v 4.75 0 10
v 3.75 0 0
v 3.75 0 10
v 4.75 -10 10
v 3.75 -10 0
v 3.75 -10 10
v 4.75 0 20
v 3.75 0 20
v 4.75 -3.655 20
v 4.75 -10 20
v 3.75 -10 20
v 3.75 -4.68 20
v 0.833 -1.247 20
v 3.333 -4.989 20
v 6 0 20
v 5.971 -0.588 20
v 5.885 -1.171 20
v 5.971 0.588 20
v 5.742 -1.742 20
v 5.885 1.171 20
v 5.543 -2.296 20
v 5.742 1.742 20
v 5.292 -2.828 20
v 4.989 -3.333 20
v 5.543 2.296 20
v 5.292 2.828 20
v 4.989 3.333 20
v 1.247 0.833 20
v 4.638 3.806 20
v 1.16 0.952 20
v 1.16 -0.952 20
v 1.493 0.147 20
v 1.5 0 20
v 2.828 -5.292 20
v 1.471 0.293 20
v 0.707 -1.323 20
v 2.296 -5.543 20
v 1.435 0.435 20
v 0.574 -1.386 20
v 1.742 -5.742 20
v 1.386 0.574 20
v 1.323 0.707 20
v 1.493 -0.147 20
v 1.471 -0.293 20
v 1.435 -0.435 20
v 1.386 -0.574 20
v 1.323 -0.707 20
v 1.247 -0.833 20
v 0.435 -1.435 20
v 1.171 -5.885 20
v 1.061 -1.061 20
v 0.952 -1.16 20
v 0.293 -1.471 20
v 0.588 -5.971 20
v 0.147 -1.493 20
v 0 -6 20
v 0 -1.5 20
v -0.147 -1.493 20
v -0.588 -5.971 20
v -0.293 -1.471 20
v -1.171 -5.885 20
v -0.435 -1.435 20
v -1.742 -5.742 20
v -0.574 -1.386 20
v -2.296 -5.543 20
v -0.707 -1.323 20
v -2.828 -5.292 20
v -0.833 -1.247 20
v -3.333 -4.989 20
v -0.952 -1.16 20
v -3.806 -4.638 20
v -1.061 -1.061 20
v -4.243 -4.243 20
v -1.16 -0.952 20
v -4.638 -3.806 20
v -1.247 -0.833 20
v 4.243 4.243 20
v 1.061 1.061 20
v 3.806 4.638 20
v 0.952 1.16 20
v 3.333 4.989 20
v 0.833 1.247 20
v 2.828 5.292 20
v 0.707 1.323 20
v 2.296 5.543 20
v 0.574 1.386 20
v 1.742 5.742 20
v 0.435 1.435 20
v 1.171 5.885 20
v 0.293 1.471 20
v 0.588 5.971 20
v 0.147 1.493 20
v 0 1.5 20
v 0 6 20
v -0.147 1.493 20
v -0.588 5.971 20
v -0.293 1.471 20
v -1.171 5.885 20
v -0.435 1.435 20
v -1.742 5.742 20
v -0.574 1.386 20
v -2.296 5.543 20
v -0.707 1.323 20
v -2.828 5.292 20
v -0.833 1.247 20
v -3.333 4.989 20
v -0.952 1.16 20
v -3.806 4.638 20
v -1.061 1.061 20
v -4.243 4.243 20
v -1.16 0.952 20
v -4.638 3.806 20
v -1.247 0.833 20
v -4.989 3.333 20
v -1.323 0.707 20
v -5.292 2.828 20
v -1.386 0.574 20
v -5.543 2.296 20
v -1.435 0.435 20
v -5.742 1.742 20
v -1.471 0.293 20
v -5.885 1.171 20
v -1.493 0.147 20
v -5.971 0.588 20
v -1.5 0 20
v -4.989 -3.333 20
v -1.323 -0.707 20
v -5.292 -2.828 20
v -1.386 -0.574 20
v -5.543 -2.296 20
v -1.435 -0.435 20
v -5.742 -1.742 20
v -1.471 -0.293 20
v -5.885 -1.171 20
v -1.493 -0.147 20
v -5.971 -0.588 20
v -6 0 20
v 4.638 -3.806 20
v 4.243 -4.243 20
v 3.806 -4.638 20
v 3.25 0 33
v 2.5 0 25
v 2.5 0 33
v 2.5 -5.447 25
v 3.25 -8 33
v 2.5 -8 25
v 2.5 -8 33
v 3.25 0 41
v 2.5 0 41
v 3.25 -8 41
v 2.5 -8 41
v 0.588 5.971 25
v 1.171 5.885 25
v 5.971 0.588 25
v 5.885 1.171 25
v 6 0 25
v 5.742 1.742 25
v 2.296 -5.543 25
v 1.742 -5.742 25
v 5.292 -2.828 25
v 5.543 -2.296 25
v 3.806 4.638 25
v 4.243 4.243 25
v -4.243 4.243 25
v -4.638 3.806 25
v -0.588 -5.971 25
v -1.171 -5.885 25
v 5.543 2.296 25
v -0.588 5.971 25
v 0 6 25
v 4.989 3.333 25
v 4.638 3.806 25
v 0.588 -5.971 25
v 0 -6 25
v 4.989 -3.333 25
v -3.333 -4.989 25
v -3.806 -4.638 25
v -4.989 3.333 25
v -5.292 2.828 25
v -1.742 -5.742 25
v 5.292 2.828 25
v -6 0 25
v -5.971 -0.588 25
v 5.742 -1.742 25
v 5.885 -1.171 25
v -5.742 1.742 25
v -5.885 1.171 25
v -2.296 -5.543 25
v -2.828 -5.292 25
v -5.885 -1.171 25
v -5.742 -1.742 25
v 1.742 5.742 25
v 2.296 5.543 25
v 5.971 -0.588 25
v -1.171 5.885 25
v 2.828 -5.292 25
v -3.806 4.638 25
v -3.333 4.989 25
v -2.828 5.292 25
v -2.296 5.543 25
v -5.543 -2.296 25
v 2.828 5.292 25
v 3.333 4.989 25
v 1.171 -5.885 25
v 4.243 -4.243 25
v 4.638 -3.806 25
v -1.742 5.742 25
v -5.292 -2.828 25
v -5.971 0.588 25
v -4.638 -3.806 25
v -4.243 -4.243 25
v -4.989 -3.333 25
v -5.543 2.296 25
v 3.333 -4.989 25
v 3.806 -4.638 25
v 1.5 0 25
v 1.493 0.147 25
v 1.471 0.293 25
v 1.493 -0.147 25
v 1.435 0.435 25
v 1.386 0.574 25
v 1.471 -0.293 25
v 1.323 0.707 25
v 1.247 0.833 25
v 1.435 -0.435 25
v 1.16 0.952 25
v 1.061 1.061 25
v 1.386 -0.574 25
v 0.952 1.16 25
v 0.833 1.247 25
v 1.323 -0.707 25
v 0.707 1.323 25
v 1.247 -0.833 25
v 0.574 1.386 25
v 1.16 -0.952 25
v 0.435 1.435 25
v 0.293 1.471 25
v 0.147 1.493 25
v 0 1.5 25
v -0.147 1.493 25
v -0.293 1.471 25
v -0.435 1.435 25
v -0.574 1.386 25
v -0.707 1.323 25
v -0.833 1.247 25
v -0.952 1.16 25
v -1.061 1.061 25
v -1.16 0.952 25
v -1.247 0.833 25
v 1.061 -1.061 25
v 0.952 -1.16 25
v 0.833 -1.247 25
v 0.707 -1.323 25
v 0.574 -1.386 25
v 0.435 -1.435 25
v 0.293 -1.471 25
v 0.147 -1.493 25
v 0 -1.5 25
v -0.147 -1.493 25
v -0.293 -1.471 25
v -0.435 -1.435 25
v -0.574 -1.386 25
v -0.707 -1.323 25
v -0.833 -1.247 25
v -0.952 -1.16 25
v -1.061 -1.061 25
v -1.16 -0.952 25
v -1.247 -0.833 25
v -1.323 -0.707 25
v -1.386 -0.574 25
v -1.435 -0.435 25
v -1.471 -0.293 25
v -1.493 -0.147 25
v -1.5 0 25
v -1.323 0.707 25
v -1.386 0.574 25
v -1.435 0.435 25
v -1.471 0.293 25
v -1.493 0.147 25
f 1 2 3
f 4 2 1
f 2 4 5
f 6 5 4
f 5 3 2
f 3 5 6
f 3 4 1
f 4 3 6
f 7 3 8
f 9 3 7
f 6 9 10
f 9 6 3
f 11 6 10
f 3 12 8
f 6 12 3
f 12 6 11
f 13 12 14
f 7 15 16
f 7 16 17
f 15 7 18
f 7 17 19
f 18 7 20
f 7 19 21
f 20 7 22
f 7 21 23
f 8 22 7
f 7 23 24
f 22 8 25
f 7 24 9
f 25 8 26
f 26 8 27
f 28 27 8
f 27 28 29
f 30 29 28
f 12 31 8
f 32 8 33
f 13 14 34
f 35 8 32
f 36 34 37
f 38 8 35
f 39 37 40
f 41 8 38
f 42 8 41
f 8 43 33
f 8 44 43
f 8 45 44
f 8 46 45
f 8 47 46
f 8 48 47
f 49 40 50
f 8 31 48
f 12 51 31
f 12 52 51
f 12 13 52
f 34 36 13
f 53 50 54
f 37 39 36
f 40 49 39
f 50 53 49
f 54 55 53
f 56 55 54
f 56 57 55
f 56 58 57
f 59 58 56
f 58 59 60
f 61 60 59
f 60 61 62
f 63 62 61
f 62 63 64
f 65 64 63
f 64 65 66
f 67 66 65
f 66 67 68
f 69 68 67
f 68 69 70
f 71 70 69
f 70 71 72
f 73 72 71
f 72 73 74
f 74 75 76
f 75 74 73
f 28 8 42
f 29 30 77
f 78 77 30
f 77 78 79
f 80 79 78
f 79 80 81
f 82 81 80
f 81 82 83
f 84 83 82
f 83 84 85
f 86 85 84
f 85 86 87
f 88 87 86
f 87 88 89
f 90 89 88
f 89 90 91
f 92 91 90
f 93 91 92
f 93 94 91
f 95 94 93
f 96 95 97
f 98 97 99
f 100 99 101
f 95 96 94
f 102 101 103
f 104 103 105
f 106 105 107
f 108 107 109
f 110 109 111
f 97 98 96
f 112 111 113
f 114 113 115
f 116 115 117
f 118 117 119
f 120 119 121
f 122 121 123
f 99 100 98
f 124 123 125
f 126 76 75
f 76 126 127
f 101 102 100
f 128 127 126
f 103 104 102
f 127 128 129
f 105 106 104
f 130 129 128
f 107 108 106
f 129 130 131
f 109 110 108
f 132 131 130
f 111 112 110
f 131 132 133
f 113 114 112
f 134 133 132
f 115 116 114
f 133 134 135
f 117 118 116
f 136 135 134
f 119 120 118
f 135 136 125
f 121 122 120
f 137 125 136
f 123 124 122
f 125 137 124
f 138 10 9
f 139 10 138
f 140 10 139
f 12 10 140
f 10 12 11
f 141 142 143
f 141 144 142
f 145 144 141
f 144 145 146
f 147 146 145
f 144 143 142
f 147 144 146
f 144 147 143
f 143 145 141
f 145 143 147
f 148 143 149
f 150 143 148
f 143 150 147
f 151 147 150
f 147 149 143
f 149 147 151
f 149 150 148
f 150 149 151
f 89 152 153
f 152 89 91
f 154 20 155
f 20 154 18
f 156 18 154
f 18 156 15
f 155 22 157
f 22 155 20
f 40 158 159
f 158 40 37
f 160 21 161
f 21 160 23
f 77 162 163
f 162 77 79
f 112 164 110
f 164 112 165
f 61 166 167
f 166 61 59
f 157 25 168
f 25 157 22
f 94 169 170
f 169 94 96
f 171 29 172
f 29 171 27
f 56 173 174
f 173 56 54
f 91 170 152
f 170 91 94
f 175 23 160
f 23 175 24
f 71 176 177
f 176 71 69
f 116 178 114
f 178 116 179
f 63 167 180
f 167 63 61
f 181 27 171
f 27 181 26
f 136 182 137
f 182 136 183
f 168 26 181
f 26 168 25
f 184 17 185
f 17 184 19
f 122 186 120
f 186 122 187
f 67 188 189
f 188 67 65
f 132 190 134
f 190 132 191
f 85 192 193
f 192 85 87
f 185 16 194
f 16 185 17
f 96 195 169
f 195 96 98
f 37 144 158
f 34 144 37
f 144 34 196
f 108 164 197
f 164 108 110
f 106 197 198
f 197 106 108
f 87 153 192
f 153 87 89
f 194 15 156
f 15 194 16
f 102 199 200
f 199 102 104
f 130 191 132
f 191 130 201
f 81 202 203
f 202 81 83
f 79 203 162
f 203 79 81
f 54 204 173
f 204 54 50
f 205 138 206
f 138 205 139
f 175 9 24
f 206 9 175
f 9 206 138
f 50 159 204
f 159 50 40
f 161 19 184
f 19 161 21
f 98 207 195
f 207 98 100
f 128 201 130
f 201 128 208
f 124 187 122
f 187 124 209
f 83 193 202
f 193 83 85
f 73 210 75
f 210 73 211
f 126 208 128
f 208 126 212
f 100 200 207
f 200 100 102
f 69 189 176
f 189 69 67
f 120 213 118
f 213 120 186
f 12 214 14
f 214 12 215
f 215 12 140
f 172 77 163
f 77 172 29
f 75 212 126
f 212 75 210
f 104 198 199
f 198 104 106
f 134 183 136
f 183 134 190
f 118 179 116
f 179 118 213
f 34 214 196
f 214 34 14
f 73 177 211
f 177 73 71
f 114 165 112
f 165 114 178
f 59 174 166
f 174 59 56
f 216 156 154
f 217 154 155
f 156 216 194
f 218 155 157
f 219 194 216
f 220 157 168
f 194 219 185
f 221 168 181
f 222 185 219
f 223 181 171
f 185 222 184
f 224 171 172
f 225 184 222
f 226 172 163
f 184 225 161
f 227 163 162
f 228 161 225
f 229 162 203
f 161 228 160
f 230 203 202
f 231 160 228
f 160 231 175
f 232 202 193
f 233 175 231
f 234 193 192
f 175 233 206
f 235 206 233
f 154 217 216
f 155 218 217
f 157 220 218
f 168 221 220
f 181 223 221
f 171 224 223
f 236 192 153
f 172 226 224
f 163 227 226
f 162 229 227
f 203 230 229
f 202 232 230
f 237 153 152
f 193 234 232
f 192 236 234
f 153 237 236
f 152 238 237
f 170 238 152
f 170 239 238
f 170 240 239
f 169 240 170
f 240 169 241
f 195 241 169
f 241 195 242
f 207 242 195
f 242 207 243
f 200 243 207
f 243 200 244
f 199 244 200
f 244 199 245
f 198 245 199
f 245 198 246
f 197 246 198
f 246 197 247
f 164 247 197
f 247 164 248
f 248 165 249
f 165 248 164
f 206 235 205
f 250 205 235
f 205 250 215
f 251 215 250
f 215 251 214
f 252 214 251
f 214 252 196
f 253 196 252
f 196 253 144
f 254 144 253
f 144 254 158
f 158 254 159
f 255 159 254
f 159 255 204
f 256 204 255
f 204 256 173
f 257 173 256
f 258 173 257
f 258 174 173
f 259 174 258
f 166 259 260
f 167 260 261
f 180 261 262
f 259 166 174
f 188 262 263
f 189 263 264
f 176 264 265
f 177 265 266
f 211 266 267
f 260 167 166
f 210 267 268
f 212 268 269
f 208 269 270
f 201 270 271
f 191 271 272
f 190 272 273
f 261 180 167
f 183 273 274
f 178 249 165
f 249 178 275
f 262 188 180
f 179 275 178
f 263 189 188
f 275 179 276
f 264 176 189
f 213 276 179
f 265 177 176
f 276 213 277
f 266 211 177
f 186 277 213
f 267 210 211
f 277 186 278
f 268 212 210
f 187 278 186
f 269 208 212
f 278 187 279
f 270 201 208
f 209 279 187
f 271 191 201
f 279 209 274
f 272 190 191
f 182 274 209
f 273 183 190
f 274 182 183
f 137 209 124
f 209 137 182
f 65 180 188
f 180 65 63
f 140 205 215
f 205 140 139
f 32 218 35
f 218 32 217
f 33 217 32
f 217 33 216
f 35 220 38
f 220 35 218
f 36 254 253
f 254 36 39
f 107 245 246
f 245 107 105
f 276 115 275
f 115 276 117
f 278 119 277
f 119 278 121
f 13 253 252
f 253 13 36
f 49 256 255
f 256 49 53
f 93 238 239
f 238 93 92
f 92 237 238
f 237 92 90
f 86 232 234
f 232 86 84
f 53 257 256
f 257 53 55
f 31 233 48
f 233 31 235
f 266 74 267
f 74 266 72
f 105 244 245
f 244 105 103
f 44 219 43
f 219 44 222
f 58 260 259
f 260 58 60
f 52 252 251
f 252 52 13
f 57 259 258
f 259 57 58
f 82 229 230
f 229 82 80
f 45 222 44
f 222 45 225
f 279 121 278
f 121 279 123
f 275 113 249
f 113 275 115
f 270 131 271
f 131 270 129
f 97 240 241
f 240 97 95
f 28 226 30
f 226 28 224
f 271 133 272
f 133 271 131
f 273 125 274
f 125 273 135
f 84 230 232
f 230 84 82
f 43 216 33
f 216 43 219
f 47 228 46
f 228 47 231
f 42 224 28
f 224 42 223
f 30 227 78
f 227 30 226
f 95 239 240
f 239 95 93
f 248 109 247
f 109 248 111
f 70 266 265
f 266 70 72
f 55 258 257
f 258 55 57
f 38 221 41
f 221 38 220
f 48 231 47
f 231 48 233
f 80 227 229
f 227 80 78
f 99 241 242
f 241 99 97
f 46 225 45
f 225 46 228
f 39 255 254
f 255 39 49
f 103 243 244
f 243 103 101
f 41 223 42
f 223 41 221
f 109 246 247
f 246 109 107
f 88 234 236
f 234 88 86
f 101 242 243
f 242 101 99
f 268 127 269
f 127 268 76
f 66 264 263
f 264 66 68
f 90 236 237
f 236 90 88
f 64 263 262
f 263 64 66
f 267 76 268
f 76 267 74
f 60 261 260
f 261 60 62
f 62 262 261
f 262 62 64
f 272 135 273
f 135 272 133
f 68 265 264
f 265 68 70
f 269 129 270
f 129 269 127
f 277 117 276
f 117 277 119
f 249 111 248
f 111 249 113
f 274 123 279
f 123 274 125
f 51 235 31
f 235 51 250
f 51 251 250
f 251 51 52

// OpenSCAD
// Hose-barb reducer: 8 mm ID -> 5 mm ID
// Print orientation: standing upright along +Z

$fn = 64;

// ---- Dimensions (mm) ----
id_8     = 8;    // inner diameter of 8 mm tubing
id_5     = 5;    // inner diameter of 5 mm tubing
bore     = 3;    // through-bore diameter
length_8 = 20;   // height of 8 mm tubing section
length_c = 5;    // height of collar section
length_5 = 16;   // height of 5 mm tubing section (z = 25 to z = 41)
eps      = 0.5;  // overlap for clean boolean cuts

// ---- Derived ----
od_8_top = 9.5;  // outer diameter at top of 8 mm barbs
od_5_bot = 6.5;  // outer diameter at bottom of 5 mm barbs

module hose_barb(id, height, od_top, od_bot) {
    // Sawtooth profile in XZ, extruded around Z axis
    rotate([90, 0, 0])
        linear_extrude(height = height)
            polygon(points = [
                [od_bot/2, 0],
                [od_top/2, height],
                [od_bot/2, height]
            ]);
}

difference() {
    union() {
        // 8 mm tubing section: two identical barbs, stacked
        for (z = [0, length_8/2])
            translate([0, 0, z])
                hose_barb(id_8, length_8/2, od_8_top, 7.5);

        // Collar
        translate([0, 0, length_8])
            cylinder(h = length_c, d = 12);

        // 5 mm tubing section: two identical barbs, stacked
        for (z = [length_8 + length_c, length_8 + length_c + length_5/2])
            translate([0, 0, z])
                hose_barb(id_5, length_5/2, od_5_bot, 5);
    }

    // Through-bore
    translate([0, 0, -eps])
        cylinder(h = length_8 + length_c + length_5 + 2*eps, d = bore);
}
